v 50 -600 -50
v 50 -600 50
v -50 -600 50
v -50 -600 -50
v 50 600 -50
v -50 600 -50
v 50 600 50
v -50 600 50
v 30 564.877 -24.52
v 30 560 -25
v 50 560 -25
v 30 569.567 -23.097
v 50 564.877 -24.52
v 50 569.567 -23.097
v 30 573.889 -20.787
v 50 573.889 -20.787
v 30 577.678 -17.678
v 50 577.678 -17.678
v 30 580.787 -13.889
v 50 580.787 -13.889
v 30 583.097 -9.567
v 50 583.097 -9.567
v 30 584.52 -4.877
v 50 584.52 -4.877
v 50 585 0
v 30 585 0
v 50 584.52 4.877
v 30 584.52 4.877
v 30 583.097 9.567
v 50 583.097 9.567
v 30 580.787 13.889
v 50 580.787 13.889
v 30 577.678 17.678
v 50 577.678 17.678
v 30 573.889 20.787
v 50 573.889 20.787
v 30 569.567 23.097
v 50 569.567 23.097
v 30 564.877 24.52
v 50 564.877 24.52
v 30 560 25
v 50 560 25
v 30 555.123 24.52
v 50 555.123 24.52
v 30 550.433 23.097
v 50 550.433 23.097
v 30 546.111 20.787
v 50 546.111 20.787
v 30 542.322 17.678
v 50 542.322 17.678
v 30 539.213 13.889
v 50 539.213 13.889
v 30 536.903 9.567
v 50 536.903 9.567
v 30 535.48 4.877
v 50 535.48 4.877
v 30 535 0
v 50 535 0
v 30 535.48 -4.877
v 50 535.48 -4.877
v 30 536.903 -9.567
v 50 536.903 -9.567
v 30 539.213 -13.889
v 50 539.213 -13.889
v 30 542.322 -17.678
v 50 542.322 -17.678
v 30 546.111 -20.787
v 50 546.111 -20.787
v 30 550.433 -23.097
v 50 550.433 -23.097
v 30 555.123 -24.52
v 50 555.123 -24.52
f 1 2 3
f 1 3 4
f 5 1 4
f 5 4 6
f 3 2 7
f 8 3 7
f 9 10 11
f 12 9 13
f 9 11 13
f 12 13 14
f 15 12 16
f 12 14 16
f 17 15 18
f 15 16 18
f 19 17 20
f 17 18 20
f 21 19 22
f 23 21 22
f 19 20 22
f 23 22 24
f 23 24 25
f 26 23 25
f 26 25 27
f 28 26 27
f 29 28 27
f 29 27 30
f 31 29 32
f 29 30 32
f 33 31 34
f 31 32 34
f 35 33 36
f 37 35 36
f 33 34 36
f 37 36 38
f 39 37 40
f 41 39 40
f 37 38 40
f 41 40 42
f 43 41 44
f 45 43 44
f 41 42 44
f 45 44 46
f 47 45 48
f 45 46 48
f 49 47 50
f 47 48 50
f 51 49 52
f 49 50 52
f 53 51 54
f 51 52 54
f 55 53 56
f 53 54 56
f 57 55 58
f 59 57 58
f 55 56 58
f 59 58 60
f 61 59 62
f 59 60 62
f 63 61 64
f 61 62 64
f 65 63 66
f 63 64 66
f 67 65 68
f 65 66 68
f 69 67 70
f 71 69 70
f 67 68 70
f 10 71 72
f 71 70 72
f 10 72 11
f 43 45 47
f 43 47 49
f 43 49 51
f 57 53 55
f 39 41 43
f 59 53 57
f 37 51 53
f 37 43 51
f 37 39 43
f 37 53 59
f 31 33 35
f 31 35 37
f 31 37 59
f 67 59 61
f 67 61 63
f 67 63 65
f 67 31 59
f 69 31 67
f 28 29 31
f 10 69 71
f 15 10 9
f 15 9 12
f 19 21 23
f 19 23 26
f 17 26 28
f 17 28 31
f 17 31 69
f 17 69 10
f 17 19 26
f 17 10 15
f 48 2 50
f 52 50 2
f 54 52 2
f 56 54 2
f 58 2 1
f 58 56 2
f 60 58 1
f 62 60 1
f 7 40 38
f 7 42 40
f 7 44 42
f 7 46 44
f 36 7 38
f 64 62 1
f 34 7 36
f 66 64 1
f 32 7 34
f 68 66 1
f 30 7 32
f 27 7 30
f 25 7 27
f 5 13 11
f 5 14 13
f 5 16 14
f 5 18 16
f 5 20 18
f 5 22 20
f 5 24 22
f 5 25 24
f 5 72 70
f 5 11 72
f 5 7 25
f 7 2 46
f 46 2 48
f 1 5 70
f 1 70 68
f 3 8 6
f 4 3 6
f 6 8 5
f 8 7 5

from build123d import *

# Parameters (mm, degrees)
SKETCH1_W           = 100
SKETCH1_H           = 1200
BOSS_EXTRUDE1_DEPTH = 50
SKETCH2_R           = 25
CUT_EXTRUDE1_DEPTH  = 20


with BuildPart() as part:
    # Sketch1 → Boss-Extrude1 (new, symmetric)
    with BuildSketch(Plane(origin=(0, 0, 0), x_dir=(0, 0, -1), z_dir=(1, 0, 0))):
        Rectangle(SKETCH1_W, SKETCH1_H)
    extrude(amount=BOSS_EXTRUDE1_DEPTH, both=True)

    # Sketch2 → Cut-Extrude1 (cut)
    with BuildSketch(Plane(origin=(50, 0, 0), x_dir=(0, 0, -1), z_dir=(1, 0, 0))):
        with Locations((0, 560)):
            Circle(SKETCH2_R)
    extrude(amount=-CUT_EXTRUDE1_DEPTH, mode=Mode.SUBTRACT)


solid = part.part
